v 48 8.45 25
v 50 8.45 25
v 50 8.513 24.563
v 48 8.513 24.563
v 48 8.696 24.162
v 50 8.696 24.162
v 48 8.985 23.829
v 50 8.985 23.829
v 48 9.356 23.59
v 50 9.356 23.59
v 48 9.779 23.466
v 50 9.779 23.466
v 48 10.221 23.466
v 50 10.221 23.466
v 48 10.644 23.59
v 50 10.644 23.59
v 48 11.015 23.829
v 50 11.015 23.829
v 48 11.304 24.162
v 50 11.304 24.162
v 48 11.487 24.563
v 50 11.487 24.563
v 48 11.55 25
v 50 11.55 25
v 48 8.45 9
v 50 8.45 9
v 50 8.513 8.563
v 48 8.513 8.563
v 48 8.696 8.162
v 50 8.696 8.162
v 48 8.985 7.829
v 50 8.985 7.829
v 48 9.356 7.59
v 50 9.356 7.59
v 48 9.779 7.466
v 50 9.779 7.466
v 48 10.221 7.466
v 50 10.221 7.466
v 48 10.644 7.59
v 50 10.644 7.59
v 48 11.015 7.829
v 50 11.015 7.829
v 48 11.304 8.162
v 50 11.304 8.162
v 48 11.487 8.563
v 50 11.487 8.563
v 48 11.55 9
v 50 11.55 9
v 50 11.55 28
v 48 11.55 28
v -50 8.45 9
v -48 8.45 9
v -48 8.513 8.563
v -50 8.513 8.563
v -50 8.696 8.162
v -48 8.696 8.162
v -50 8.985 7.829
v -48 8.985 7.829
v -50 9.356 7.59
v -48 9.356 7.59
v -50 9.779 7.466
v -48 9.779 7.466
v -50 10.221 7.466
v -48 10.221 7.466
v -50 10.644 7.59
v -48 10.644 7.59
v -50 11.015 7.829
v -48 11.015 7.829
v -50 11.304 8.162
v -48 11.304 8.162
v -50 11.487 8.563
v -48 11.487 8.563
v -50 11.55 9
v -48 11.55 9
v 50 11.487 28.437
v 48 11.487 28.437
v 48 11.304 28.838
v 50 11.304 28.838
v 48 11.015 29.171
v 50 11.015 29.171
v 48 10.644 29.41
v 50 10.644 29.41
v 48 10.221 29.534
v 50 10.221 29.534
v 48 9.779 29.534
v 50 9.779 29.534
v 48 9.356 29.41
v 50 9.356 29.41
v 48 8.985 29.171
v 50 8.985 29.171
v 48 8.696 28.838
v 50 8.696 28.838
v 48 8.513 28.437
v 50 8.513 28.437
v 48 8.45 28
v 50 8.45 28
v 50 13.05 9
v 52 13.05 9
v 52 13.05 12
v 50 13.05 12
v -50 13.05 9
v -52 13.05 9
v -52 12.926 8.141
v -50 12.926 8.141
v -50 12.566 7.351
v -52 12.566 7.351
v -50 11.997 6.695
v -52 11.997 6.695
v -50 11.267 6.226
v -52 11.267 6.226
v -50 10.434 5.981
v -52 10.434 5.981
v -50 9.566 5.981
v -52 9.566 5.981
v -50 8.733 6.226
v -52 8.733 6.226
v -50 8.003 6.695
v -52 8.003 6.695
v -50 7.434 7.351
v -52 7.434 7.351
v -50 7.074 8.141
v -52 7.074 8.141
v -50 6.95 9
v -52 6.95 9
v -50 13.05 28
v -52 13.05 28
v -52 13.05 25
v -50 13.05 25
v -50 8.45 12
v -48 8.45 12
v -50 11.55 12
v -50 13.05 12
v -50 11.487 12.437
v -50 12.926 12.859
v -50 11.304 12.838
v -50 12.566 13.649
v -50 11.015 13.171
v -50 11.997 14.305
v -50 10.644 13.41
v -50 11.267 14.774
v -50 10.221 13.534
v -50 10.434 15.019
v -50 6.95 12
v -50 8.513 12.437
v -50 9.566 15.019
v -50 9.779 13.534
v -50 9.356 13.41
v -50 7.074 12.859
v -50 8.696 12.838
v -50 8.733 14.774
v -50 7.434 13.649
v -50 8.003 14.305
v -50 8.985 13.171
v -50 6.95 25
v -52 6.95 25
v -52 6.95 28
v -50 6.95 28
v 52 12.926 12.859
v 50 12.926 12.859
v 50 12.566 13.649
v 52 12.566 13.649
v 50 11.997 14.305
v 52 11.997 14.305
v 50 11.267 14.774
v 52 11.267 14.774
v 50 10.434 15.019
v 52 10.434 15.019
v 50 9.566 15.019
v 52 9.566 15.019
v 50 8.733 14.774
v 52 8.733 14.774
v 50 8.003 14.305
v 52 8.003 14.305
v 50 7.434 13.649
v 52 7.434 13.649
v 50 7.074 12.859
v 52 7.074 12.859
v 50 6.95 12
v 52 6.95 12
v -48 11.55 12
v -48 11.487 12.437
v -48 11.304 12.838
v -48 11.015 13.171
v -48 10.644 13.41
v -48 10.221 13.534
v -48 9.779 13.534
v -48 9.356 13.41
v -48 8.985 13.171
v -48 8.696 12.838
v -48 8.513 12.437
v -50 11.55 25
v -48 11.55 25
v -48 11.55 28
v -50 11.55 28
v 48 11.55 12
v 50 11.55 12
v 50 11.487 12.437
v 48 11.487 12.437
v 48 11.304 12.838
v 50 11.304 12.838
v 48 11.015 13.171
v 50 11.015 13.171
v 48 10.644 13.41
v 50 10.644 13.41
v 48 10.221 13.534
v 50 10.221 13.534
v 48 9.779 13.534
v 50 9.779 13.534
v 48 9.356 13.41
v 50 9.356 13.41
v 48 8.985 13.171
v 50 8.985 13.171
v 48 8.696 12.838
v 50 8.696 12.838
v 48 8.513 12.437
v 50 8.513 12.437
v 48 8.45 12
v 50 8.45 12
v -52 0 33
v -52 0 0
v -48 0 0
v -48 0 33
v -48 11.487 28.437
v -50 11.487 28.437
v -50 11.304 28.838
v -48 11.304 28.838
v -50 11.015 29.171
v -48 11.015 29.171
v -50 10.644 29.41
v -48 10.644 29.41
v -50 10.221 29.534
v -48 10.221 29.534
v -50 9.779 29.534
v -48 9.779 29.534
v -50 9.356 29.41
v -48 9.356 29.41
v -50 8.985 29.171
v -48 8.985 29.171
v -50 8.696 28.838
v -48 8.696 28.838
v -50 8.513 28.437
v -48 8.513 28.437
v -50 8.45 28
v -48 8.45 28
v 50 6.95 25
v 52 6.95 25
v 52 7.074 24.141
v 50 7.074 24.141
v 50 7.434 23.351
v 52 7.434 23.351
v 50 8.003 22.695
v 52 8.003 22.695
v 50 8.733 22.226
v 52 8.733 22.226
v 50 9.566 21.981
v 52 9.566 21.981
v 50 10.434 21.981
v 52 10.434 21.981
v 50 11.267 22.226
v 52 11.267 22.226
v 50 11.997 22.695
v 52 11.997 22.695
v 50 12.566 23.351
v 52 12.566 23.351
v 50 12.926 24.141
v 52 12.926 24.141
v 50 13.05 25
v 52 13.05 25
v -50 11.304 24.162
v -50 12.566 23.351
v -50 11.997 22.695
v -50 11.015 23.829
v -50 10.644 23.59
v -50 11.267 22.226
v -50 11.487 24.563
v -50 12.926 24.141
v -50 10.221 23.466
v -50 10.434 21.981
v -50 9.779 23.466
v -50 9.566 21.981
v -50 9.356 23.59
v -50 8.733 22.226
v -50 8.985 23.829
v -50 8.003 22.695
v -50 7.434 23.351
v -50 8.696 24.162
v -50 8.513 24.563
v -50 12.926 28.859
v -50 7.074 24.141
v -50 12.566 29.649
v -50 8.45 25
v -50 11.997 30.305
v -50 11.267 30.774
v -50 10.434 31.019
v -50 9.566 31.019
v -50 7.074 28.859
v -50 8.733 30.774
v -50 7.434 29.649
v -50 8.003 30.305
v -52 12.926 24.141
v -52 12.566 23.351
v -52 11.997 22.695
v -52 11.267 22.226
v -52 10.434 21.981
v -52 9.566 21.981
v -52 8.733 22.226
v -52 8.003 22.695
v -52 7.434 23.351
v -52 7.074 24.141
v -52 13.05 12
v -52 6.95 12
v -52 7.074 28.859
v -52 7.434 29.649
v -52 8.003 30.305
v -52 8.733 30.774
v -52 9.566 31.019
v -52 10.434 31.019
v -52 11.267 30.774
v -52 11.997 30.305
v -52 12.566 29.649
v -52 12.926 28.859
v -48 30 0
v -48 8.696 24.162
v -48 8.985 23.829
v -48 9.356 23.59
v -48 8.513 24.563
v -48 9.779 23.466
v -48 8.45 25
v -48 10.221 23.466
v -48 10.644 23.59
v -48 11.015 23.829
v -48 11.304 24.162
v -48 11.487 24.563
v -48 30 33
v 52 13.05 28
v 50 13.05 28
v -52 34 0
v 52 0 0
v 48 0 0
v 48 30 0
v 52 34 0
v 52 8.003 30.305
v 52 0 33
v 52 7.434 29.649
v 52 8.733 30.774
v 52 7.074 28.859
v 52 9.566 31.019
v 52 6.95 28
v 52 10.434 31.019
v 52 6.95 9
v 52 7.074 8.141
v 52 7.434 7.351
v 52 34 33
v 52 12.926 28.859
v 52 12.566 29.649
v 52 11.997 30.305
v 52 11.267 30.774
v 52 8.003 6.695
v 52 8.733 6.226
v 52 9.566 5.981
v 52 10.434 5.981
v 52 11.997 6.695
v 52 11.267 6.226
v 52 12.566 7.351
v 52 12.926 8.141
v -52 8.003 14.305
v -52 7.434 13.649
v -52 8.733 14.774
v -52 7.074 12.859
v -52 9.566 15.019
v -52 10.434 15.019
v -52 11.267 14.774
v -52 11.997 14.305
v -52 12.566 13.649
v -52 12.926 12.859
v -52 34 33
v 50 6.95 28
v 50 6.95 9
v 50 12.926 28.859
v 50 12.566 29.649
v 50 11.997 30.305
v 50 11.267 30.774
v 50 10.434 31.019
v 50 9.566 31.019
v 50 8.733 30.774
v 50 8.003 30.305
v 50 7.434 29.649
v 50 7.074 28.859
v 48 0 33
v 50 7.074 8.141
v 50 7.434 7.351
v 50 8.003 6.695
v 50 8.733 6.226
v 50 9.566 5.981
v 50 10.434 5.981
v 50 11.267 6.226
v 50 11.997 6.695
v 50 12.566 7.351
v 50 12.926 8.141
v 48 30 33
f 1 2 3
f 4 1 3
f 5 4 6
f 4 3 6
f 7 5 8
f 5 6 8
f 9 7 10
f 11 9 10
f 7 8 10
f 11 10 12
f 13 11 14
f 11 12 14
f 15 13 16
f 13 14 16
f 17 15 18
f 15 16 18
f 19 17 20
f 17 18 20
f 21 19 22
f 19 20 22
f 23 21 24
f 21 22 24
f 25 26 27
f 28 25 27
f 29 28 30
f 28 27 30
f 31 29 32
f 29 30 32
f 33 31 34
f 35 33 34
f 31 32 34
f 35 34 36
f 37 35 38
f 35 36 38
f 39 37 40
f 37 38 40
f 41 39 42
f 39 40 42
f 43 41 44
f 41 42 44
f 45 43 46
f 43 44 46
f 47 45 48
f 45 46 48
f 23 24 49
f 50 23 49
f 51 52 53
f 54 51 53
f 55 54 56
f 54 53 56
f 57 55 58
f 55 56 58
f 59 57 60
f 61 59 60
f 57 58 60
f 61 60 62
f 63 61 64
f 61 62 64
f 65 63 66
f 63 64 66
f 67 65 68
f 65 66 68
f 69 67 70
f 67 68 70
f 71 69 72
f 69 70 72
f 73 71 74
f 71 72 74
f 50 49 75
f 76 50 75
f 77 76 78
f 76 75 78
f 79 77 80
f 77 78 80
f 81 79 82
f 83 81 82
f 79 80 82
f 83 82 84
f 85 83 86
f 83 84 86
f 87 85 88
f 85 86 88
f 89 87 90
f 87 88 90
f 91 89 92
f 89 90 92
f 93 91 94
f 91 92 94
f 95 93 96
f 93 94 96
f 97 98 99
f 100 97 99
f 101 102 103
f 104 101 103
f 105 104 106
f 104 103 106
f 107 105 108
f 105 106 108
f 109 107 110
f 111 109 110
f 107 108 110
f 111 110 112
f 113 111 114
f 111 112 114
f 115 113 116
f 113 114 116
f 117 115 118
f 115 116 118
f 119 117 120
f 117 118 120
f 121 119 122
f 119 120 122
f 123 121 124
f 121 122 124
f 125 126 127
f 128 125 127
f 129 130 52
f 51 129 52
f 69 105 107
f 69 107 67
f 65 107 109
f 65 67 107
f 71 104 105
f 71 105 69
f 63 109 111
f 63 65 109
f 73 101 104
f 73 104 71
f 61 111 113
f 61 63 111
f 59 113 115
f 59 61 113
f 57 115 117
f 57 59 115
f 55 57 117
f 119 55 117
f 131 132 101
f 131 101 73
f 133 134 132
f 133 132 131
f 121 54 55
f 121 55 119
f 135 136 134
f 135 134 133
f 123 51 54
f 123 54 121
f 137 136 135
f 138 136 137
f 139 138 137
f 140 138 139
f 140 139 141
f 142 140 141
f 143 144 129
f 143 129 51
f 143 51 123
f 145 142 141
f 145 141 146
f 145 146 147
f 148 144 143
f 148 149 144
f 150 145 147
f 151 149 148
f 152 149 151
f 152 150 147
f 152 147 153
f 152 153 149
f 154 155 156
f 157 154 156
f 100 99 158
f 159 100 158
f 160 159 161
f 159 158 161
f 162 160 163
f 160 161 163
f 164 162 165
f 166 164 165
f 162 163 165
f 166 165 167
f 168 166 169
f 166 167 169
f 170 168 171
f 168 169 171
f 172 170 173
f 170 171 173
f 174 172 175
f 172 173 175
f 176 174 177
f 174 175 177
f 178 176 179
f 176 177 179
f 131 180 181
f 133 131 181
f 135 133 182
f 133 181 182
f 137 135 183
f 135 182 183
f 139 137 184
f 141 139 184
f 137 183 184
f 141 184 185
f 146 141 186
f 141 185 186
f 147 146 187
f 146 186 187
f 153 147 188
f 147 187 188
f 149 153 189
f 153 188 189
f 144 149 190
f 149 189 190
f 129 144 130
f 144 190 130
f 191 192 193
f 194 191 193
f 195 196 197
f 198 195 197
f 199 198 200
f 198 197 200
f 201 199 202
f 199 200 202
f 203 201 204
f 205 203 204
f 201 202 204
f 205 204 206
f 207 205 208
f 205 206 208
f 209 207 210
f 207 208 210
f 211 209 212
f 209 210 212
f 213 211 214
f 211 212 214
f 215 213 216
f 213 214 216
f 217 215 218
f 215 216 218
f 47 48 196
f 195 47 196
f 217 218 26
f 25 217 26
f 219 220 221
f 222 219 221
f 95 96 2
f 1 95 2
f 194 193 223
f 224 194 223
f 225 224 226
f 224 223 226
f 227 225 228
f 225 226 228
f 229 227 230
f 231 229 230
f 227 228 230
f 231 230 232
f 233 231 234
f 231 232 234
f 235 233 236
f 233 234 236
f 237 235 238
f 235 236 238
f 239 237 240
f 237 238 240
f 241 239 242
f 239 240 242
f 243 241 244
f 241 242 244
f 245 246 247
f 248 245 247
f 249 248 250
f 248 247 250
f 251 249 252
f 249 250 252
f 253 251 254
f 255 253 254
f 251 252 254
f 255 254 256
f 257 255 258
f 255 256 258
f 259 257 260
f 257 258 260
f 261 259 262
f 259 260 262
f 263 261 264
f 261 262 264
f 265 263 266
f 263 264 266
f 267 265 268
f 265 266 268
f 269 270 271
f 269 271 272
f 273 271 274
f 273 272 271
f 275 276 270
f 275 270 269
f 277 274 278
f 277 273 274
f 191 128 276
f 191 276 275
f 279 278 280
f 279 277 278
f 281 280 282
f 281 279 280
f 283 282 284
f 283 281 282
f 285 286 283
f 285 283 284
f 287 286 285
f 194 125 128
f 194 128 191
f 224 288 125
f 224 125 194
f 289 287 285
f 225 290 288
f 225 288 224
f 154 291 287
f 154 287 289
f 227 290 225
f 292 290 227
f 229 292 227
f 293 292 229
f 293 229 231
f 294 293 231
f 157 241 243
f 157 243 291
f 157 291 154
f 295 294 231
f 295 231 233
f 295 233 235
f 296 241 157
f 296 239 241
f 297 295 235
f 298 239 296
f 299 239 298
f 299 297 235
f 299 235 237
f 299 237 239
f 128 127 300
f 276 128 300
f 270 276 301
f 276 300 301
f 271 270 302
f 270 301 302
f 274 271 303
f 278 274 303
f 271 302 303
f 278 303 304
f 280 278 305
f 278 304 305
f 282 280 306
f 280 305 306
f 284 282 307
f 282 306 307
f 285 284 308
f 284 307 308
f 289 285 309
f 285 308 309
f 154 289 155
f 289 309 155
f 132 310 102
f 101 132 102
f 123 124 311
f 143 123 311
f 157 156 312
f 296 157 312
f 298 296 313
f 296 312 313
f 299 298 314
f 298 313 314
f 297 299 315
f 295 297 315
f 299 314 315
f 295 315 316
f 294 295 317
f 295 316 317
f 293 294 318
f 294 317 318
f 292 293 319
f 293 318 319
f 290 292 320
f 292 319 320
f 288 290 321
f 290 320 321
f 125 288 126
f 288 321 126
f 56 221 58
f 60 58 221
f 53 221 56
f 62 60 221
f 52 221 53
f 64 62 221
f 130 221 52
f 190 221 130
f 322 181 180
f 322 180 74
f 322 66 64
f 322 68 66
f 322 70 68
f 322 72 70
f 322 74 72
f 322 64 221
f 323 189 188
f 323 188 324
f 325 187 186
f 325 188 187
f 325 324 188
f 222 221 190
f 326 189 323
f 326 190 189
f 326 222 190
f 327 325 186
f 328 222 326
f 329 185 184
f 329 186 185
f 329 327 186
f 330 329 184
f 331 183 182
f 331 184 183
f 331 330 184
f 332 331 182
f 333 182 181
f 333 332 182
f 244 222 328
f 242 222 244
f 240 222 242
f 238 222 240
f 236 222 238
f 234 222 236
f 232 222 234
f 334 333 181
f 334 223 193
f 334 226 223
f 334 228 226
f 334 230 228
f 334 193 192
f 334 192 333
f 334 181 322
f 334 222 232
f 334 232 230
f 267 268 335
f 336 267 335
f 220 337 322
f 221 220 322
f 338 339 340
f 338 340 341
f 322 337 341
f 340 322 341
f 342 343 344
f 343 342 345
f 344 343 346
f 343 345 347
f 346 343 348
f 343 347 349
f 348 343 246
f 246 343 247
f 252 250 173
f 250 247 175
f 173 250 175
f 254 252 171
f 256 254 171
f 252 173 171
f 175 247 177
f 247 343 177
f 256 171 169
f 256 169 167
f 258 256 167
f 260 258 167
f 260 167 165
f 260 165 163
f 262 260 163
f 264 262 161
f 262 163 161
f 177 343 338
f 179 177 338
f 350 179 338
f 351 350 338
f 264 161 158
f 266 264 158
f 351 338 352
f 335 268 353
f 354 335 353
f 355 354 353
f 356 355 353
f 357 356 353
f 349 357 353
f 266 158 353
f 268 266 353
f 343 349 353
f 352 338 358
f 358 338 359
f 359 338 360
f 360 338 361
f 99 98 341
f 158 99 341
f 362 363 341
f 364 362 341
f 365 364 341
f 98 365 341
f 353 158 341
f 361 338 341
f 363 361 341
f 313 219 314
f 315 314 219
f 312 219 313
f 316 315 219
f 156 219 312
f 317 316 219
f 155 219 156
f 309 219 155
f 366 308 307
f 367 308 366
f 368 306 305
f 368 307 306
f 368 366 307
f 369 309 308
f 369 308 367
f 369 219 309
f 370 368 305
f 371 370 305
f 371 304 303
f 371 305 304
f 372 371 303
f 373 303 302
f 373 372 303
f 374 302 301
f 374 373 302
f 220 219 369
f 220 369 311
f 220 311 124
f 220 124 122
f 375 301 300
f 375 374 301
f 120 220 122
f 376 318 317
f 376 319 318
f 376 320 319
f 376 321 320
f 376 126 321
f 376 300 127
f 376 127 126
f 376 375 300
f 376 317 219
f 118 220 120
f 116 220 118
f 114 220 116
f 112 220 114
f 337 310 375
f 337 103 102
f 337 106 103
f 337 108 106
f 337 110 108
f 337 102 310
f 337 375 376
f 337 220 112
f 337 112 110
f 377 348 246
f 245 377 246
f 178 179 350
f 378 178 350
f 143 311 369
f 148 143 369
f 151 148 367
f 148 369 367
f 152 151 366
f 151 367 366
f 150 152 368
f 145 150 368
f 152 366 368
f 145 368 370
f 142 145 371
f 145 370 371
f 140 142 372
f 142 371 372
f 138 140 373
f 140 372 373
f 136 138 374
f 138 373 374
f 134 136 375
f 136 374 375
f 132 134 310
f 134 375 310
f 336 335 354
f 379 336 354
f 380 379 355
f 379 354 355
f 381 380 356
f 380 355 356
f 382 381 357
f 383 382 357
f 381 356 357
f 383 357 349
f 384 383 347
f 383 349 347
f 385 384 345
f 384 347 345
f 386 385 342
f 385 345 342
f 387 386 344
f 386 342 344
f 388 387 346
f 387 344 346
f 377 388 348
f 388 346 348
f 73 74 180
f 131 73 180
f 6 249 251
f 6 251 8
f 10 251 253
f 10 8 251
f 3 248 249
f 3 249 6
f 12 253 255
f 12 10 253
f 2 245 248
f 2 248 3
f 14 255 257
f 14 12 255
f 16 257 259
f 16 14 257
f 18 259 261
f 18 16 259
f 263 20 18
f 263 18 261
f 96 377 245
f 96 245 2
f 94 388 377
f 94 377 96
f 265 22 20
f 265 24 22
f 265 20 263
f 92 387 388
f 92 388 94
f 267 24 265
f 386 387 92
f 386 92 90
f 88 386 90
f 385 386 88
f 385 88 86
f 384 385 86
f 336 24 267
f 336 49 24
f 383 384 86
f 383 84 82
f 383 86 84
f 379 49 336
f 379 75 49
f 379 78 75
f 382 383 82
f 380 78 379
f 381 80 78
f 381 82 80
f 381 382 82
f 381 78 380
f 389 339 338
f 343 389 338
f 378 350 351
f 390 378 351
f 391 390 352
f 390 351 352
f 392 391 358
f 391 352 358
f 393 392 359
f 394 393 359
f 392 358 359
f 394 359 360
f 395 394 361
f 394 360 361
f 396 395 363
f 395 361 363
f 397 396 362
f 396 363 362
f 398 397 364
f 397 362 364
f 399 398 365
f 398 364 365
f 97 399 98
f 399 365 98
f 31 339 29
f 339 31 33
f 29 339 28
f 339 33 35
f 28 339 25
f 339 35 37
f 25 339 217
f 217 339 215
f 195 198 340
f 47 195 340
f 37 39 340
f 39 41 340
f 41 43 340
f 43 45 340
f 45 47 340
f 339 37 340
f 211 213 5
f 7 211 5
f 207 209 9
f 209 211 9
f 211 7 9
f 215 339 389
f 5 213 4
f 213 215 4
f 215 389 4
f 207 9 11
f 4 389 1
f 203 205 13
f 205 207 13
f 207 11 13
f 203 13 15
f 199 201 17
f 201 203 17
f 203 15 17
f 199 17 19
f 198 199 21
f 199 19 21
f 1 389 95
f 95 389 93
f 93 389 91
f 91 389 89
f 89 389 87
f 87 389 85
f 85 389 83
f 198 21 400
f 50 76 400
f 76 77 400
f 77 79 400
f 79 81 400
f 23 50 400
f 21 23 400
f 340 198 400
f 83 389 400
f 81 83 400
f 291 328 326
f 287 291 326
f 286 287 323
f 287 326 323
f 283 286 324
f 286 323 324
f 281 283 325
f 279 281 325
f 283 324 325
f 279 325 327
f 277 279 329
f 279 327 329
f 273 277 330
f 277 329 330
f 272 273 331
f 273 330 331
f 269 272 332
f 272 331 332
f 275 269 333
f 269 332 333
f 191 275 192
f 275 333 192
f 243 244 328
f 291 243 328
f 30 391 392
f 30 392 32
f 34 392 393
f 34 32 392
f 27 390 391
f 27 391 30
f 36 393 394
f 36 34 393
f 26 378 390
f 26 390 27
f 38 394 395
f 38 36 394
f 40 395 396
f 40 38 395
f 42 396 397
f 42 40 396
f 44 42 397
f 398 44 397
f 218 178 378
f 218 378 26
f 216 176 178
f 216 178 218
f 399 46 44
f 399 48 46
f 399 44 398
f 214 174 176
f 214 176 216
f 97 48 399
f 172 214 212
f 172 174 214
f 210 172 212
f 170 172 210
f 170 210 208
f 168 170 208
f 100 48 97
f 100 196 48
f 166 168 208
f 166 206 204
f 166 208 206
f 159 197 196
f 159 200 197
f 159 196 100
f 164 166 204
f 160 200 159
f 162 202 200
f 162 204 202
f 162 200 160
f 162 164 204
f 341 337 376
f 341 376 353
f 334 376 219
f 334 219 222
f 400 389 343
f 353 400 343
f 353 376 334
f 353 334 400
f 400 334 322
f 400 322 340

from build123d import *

# Parameters (mm, degrees)
SKETCH_W        = 104
SKETCH_H        = 34
PAD_DEPTH       = 33
SKETCH001_W     = 96
SKETCH001_H     = 30
POCKET_DEPTH    = 33.001
POCKET001_DEPTH = 104.001
POCKET002_DEPTH = 2
POCKET003_DEPTH = 2


with BuildPart() as part:
    # Sketch → Pad (new body)
    with BuildSketch(Plane.XY):
        with Locations((0, 17)):
            Rectangle(SKETCH_W, SKETCH_H)
    extrude(amount=PAD_DEPTH)

    # Sketch001 (on Face6 of Pad) → Pocket (cut, through all)
    with BuildSketch(Plane.XY.offset(33)):
        with Locations((0, 15)):
            Rectangle(SKETCH001_W, SKETCH001_H)
    extrude(amount=-POCKET_DEPTH, mode=Mode.SUBTRACT)

    # Sketch002 (on Face7 of Pocket) → Pocket001 (cut, through all)
    with BuildSketch(Plane.YZ.offset(52)):
        with BuildLine():
            ThreePointArc((11.55, 28), (10, 29.55), (8.45, 28))
            Line((8.45, 28), (8.45, 25))
            ThreePointArc((8.45, 25), (10, 23.45), (11.55, 25))
            Line((11.55, 25), (11.55, 28))
        make_face()
        with BuildLine():
            ThreePointArc((11.55, 12), (10, 13.55), (8.45, 12))
            Line((8.45, 12), (8.45, 9))
            ThreePointArc((8.45, 9), (10, 7.45), (11.55, 9))
            Line((11.55, 9), (11.55, 12))
        make_face()
    extrude(amount=-POCKET001_DEPTH, mode=Mode.SUBTRACT)

    # Sketch003 (on Face7 of Pocket001) → Pocket002 (cut)
    with BuildSketch(Plane.YZ.offset(52)):
        with BuildLine():
            ThreePointArc((13.05, 28), (10, 31.05), (6.95, 28))
            Line((6.95, 28), (6.95, 25))
            ThreePointArc((6.95, 25), (10, 21.95), (13.05, 25))
            Line((13.05, 25), (13.05, 28))
        make_face()
        with BuildLine():
            ThreePointArc((13.05, 12), (10, 15.05), (6.95, 12))
            Line((6.95, 12), (6.95, 9))
            ThreePointArc((6.95, 9), (10, 5.95), (13.05, 9))
            Line((13.05, 9), (13.05, 12))
        make_face()
    extrude(amount=-POCKET002_DEPTH, mode=Mode.SUBTRACT)

    # Sketch004 (on Face5 of Pocket002) → Pocket003 (cut)
    with BuildSketch(Plane(origin=(-52, 0, 0), x_dir=(0, -1, 0), z_dir=(-1, 0, 0))):
        with BuildLine():
            ThreePointArc((-6.95, 28), (-10, 31.05), (-13.05, 28))
            Line((-13.05, 28), (-13.05, 25))
            ThreePointArc((-13.05, 25), (-10, 21.95), (-6.95, 25))
            Line((-6.95, 25), (-6.95, 28))
        make_face()
        with BuildLine():
            ThreePointArc((-6.95, 12), (-10, 15.05), (-13.05, 12))
            Line((-13.05, 12), (-13.05, 9))
            ThreePointArc((-13.05, 9), (-10, 5.95), (-6.95, 9))
            Line((-6.95, 9), (-6.95, 12))
        make_face()
    extrude(amount=-POCKET003_DEPTH, mode=Mode.SUBTRACT)


solid = part.part
